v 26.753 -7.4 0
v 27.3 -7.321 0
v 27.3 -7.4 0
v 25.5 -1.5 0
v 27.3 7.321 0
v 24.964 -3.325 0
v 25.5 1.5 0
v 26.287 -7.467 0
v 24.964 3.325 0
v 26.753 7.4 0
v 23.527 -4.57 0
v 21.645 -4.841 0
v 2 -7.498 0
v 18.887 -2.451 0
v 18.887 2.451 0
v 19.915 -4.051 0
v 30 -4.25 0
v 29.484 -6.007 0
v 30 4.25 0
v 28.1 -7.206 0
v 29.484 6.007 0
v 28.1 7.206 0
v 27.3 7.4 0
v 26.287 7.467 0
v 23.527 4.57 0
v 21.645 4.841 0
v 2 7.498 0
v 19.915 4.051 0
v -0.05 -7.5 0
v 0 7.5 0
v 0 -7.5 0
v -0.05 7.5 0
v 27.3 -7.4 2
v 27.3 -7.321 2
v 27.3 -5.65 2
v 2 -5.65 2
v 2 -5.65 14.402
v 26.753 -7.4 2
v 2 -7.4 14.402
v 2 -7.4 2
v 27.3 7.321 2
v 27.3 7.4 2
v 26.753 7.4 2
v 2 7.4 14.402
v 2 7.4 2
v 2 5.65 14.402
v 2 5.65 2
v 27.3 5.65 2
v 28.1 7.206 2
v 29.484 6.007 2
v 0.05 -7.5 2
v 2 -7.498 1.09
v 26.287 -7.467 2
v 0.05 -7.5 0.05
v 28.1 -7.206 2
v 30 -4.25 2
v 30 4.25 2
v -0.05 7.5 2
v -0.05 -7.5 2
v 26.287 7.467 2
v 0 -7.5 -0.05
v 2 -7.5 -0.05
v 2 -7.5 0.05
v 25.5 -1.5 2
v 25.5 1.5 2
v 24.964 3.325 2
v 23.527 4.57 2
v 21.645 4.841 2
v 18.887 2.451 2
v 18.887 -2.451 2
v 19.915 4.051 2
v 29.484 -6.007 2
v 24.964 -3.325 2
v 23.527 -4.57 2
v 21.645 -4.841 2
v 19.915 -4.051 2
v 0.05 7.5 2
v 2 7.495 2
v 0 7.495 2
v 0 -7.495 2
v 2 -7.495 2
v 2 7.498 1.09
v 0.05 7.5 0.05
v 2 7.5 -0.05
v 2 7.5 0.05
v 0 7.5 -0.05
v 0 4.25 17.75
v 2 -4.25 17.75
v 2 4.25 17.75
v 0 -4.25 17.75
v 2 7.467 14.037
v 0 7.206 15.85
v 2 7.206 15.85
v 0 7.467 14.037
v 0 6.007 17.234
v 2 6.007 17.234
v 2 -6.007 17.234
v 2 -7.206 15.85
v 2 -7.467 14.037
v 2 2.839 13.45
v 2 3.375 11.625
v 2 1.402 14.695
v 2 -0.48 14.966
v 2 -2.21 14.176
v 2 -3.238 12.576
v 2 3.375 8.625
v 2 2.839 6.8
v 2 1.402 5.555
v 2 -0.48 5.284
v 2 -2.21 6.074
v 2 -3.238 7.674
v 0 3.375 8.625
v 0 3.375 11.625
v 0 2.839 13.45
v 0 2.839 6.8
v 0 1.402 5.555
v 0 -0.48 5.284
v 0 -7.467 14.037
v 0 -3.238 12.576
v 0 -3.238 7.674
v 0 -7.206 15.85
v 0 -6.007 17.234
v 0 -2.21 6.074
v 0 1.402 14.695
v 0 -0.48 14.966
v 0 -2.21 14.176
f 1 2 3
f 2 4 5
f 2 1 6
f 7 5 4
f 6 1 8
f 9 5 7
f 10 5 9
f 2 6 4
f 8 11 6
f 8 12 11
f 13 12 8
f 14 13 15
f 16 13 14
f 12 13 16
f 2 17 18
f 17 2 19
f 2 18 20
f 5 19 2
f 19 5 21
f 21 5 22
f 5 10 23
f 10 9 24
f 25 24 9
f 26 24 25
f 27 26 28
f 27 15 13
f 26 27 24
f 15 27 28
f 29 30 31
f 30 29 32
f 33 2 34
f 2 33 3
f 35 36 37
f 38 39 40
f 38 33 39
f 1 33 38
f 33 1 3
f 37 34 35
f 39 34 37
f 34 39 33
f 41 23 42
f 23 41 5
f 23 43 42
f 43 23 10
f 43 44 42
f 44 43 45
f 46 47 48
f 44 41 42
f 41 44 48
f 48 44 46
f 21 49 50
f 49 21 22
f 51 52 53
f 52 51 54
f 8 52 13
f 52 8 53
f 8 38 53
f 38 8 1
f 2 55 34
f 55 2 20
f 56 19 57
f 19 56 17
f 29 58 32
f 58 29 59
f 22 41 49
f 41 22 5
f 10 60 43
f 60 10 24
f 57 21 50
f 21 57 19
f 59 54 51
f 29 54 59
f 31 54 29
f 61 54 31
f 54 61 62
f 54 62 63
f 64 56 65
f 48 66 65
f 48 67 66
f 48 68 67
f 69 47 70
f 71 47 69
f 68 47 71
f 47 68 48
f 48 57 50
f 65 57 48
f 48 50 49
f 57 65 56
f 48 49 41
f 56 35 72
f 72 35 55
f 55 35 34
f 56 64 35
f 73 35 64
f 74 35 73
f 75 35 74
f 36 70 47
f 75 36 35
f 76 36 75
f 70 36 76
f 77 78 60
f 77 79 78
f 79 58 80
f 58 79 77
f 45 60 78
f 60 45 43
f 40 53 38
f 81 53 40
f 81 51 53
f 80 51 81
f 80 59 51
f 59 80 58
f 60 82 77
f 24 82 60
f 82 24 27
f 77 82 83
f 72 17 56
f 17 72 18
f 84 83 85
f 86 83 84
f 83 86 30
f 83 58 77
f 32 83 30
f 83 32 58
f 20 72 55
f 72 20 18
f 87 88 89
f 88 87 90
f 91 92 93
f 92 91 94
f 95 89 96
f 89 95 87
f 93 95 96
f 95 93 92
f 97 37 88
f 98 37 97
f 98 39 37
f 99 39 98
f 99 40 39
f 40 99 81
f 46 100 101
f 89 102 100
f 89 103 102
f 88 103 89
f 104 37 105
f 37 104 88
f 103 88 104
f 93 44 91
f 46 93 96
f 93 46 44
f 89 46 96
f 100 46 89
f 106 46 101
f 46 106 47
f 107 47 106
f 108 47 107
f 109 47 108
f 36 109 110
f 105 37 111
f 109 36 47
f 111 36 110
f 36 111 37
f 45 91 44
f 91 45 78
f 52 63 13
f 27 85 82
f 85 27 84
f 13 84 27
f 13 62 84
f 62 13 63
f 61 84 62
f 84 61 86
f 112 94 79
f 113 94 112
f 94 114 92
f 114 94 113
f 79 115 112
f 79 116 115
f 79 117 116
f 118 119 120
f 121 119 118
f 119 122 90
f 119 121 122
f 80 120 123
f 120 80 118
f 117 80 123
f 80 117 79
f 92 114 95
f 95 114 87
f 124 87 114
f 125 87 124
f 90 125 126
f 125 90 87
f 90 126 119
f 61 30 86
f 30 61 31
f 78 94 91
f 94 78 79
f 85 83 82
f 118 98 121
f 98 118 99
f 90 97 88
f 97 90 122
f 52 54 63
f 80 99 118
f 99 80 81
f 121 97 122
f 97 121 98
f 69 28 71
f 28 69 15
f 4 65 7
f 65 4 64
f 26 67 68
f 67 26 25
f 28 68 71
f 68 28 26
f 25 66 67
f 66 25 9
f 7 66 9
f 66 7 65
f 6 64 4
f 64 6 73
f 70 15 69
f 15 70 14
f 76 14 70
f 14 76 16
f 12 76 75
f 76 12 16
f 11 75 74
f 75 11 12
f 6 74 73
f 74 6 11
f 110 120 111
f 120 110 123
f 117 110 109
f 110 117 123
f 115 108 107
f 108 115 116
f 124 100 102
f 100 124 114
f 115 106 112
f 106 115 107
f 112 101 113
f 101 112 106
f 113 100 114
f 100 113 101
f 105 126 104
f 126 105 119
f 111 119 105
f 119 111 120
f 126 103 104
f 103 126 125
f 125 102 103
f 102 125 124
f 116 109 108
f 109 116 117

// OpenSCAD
//********************************************************************
//********************************************************************
//Simple drawer or shelf bracket
//by Marc Sulfridge
//********************************************************************
//********************************************************************

//********************************************************************
//User defined parameters
//********************************************************************
//Width of bracket.
width = 15; // [2:25]
//Lenght of side reinforcement triangles.
side_len = 27.5; // [5:50]
//Height of side reinforcement triangles.
side_ht = 14.5; // [5:50]
//Length of horizontal base.
length = 30; // [5:50]
//Height of vertical base.
up_ht = 17.75; // [5:50]
//Thickness of base and side.
thick = 2; // [0.25:2.5]
//Thickness of side reinforcement triangles.
side_thk = 1.75; // [0.25:2.5]
//Radius of corner fillets.
fillet_rad = 3.25; // [0.5:5]
//Distance between end of horizontal base and center of horizontal hole.
base_hole_gap = 4.5; // [1:10]
//Distance between top of vertical base and center of vertical hole.
side_hole_gap = 5.25; // [1:10]
//Short axis (diameter) of screw holes.
hole_dia = 6.75; // [1:10]
//Long axis (length) of screw holes.
hole_wid = 9.75; // [2:20]
//Fudge factor to ensure overlaps.
dt = 0.1; // [0.001,0.01,0.1]
//********************************************************************

module hole(){
	hull(){
		for (i=[-1,1]){
			translate([0,i*(hole_wid-hole_dia)/2,-dt/2])
			cylinder(r=hole_dia/2,h=thick+dt,center=false);
		}
	}
}

module side(){
	hull(){
		cube([dt,side_thk,side_ht], center=false);

		translate([side_len-thick,0,0])
		cube([dt,side_thk,thick], center=false);
	}
}

module base(long){
	translate([0,0,thick/2])
	hull(){
		cube([dt,width,thick], center=true);
		
		for (i=[-1,1]){
			translate([long-fillet_rad,i*(width/2-fillet_rad),0])
			cylinder(r=fillet_rad,h=thick,center=true);
		}
	}
}

module upright(long){
	translate([thick,0,0])
	rotate([0,-90,0])
	base(long);
}

difference(){
	union(){
		base(length);
		upright(up_ht);
		
		for (i=[-width/2+dt, width/2-side_thk-dt]){
			translate([thick-3*dt,i,0])
			side();
		}
	}

	translate([length-base_hole_gap-hole_dia/2,0,0])
	hole();

	translate([thick,0,side_hole_gap+hole_wid/2])
	rotate([0,-90,0])
	rotate([0,0,90])
	hole();
}
